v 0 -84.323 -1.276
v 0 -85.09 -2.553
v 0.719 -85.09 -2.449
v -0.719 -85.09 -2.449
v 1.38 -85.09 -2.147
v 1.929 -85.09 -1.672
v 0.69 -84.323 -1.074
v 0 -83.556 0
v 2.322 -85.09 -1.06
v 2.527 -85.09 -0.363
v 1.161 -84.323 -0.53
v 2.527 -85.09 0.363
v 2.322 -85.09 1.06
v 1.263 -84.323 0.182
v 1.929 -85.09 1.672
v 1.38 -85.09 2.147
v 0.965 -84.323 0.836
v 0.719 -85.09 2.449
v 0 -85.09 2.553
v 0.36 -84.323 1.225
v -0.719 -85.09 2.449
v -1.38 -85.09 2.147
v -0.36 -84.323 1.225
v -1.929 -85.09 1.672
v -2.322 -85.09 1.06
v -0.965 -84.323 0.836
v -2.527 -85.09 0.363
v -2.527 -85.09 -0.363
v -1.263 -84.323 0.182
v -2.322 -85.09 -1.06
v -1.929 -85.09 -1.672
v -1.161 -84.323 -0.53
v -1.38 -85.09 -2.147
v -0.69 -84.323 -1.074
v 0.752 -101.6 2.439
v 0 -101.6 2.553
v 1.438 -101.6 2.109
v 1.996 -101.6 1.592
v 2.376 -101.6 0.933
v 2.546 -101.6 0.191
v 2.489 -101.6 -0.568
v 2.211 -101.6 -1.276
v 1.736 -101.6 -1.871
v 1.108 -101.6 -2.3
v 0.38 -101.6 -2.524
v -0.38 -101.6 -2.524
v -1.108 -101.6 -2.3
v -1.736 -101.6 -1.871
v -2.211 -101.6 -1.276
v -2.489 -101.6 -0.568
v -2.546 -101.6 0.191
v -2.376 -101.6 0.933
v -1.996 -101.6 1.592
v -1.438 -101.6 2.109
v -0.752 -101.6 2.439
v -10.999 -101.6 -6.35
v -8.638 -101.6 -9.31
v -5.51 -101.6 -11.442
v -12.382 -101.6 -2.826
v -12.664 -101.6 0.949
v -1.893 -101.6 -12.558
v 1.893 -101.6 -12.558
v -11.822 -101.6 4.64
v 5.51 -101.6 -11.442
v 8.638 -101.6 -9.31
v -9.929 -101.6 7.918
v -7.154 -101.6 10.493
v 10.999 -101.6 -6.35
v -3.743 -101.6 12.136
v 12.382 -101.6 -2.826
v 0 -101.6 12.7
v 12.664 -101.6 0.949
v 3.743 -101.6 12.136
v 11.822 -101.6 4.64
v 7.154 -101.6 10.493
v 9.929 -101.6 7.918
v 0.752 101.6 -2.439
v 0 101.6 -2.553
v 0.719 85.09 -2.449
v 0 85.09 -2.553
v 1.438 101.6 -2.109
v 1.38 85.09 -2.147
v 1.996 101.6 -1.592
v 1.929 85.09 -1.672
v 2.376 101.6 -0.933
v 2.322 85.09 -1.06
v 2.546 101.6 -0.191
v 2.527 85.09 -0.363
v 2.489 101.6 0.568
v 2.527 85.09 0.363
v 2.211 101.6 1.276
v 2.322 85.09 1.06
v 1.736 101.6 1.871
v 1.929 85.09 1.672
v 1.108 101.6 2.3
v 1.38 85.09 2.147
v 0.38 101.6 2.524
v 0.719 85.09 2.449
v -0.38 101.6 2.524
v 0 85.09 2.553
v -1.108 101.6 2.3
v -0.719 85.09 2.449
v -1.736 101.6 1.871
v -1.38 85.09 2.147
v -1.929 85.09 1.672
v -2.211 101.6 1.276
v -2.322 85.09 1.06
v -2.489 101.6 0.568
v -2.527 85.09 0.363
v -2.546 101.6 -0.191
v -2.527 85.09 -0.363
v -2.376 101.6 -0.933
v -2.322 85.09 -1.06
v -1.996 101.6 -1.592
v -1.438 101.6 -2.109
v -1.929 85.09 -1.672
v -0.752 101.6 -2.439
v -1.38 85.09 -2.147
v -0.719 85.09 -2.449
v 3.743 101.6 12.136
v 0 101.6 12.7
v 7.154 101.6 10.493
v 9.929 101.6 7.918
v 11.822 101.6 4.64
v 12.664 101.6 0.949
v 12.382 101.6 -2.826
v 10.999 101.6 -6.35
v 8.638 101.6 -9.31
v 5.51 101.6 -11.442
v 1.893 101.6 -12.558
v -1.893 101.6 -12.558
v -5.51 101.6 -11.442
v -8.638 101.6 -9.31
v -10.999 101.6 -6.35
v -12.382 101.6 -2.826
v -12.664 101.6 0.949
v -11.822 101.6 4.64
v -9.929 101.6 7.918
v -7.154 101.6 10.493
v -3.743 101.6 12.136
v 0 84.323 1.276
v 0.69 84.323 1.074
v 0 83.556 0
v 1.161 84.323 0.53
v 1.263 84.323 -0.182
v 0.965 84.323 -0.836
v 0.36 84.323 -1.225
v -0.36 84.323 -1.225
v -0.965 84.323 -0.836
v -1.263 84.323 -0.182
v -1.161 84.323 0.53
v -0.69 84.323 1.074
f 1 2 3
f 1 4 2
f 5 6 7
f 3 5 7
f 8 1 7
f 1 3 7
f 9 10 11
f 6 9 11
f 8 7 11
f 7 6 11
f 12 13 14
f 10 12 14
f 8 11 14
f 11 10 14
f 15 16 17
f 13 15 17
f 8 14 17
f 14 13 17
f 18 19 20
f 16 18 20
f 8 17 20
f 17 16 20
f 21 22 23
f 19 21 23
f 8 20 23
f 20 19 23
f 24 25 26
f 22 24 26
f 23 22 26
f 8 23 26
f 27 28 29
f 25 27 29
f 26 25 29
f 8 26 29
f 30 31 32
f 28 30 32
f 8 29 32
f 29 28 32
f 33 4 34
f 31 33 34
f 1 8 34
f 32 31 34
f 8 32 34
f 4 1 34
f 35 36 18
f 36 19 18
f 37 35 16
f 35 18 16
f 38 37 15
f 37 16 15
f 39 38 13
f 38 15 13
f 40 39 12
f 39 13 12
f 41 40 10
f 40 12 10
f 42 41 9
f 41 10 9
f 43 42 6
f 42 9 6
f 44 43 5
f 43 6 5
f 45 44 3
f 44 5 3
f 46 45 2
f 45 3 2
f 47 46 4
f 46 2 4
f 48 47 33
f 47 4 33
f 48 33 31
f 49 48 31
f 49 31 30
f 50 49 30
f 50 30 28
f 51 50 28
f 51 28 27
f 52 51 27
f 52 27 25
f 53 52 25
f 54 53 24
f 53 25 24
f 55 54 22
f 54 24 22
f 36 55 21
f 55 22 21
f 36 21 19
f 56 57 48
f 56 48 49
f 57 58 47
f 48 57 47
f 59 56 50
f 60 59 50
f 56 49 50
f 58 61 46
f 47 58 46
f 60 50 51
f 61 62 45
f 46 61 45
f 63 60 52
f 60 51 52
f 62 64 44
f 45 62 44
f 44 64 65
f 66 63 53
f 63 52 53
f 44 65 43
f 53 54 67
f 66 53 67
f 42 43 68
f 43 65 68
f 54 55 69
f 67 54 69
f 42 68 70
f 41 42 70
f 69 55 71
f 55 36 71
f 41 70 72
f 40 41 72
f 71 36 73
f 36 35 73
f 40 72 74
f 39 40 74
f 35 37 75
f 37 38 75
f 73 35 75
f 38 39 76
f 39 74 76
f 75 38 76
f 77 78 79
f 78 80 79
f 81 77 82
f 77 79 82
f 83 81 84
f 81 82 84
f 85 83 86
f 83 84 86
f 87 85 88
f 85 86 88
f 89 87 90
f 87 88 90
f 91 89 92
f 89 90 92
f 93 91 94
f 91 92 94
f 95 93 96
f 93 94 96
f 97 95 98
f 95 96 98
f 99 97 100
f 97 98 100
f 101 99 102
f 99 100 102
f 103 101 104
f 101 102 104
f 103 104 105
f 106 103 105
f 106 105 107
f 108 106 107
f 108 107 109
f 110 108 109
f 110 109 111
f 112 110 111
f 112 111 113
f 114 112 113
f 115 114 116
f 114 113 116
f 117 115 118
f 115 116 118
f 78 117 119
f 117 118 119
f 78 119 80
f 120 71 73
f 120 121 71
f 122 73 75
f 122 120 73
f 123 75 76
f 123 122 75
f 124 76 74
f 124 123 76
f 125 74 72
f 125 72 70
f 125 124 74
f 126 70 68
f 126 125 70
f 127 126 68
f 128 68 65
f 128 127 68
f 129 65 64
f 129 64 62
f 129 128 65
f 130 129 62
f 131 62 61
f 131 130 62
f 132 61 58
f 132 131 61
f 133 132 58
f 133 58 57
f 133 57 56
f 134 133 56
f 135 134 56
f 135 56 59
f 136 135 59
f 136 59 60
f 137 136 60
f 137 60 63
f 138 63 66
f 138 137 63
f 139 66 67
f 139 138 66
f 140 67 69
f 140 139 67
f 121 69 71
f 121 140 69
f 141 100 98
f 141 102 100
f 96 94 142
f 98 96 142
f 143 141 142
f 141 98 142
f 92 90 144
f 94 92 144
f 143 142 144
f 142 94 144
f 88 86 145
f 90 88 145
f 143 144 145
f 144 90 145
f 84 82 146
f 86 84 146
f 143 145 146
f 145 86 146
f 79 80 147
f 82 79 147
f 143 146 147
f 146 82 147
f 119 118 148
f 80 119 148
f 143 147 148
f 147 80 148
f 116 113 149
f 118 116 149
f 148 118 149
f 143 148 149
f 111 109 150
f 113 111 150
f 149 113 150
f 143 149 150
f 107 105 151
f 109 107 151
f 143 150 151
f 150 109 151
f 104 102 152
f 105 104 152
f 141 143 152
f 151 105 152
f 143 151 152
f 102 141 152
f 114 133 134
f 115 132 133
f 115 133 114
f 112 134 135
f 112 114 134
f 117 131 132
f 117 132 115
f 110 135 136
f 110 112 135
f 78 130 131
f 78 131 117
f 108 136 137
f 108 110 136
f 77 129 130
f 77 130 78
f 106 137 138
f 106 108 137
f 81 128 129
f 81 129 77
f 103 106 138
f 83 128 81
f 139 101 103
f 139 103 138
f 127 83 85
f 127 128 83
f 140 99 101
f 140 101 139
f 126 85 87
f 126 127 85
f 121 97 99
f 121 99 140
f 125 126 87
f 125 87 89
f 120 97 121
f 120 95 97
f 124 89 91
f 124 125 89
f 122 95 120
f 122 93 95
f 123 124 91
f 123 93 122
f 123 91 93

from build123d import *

# Parameters (mm, degrees)
SKETCH1_R                             = 12.7
BOSS_EXTRUDE1_DEPTH                   = 101.6
F_1_4_20_TAPPED_HOLE1_D               = 5.1054
F_1_4_20_TAPPED_HOLE1_DEPTH           = 16.51
F_1_4_20_TAPPED_HOLE1_TIP             = 1.533816902
F_1_4_20_TAPPED_HOLE1_ON_FACE_2_D     = 5.1054
F_1_4_20_TAPPED_HOLE1_ON_FACE_2_DEPTH = 16.51
F_1_4_20_TAPPED_HOLE1_ON_FACE_2_TIP   = 1.533816902


with BuildPart() as part:
    # Sketch1 → Boss-Extrude1 (new, symmetric)
    with BuildSketch(Plane(origin=(0, 0, 0), x_dir=(1, 0, 0), z_dir=(0, 1, 0))):
        with Locations(Location((0, 0, 0), (0, 0, 270))):
            Circle(SKETCH1_R)
    extrude(amount=BOSS_EXTRUDE1_DEPTH, both=True)

    # 1/4-20 Tapped Hole1
    with Locations(Plane.ZX.offset(101.6)):
        with Locations((0, 0)):
            Hole(F_1_4_20_TAPPED_HOLE1_D / 2, depth=F_1_4_20_TAPPED_HOLE1_DEPTH)
            with Locations((0, 0, -(F_1_4_20_TAPPED_HOLE1_DEPTH + F_1_4_20_TAPPED_HOLE1_TIP / 2))):  # 118° drill point
                Cone(0, F_1_4_20_TAPPED_HOLE1_D / 2, F_1_4_20_TAPPED_HOLE1_TIP, mode=Mode.SUBTRACT)

    # 1/4-20 Tapped Hole1 on face 2
    with Locations(Plane(origin=(0, -101.6, 0), x_dir=(0, 0, -1), z_dir=(0, -1, 0))):
        with Locations((0, 0)):
            Hole(F_1_4_20_TAPPED_HOLE1_ON_FACE_2_D / 2, depth=F_1_4_20_TAPPED_HOLE1_ON_FACE_2_DEPTH)
            with Locations((0, 0, -(F_1_4_20_TAPPED_HOLE1_ON_FACE_2_DEPTH + F_1_4_20_TAPPED_HOLE1_ON_FACE_2_TIP / 2))):  # 118° drill point
                Cone(0, F_1_4_20_TAPPED_HOLE1_ON_FACE_2_D / 2, F_1_4_20_TAPPED_HOLE1_ON_FACE_2_TIP, mode=Mode.SUBTRACT)


solid = part.part
